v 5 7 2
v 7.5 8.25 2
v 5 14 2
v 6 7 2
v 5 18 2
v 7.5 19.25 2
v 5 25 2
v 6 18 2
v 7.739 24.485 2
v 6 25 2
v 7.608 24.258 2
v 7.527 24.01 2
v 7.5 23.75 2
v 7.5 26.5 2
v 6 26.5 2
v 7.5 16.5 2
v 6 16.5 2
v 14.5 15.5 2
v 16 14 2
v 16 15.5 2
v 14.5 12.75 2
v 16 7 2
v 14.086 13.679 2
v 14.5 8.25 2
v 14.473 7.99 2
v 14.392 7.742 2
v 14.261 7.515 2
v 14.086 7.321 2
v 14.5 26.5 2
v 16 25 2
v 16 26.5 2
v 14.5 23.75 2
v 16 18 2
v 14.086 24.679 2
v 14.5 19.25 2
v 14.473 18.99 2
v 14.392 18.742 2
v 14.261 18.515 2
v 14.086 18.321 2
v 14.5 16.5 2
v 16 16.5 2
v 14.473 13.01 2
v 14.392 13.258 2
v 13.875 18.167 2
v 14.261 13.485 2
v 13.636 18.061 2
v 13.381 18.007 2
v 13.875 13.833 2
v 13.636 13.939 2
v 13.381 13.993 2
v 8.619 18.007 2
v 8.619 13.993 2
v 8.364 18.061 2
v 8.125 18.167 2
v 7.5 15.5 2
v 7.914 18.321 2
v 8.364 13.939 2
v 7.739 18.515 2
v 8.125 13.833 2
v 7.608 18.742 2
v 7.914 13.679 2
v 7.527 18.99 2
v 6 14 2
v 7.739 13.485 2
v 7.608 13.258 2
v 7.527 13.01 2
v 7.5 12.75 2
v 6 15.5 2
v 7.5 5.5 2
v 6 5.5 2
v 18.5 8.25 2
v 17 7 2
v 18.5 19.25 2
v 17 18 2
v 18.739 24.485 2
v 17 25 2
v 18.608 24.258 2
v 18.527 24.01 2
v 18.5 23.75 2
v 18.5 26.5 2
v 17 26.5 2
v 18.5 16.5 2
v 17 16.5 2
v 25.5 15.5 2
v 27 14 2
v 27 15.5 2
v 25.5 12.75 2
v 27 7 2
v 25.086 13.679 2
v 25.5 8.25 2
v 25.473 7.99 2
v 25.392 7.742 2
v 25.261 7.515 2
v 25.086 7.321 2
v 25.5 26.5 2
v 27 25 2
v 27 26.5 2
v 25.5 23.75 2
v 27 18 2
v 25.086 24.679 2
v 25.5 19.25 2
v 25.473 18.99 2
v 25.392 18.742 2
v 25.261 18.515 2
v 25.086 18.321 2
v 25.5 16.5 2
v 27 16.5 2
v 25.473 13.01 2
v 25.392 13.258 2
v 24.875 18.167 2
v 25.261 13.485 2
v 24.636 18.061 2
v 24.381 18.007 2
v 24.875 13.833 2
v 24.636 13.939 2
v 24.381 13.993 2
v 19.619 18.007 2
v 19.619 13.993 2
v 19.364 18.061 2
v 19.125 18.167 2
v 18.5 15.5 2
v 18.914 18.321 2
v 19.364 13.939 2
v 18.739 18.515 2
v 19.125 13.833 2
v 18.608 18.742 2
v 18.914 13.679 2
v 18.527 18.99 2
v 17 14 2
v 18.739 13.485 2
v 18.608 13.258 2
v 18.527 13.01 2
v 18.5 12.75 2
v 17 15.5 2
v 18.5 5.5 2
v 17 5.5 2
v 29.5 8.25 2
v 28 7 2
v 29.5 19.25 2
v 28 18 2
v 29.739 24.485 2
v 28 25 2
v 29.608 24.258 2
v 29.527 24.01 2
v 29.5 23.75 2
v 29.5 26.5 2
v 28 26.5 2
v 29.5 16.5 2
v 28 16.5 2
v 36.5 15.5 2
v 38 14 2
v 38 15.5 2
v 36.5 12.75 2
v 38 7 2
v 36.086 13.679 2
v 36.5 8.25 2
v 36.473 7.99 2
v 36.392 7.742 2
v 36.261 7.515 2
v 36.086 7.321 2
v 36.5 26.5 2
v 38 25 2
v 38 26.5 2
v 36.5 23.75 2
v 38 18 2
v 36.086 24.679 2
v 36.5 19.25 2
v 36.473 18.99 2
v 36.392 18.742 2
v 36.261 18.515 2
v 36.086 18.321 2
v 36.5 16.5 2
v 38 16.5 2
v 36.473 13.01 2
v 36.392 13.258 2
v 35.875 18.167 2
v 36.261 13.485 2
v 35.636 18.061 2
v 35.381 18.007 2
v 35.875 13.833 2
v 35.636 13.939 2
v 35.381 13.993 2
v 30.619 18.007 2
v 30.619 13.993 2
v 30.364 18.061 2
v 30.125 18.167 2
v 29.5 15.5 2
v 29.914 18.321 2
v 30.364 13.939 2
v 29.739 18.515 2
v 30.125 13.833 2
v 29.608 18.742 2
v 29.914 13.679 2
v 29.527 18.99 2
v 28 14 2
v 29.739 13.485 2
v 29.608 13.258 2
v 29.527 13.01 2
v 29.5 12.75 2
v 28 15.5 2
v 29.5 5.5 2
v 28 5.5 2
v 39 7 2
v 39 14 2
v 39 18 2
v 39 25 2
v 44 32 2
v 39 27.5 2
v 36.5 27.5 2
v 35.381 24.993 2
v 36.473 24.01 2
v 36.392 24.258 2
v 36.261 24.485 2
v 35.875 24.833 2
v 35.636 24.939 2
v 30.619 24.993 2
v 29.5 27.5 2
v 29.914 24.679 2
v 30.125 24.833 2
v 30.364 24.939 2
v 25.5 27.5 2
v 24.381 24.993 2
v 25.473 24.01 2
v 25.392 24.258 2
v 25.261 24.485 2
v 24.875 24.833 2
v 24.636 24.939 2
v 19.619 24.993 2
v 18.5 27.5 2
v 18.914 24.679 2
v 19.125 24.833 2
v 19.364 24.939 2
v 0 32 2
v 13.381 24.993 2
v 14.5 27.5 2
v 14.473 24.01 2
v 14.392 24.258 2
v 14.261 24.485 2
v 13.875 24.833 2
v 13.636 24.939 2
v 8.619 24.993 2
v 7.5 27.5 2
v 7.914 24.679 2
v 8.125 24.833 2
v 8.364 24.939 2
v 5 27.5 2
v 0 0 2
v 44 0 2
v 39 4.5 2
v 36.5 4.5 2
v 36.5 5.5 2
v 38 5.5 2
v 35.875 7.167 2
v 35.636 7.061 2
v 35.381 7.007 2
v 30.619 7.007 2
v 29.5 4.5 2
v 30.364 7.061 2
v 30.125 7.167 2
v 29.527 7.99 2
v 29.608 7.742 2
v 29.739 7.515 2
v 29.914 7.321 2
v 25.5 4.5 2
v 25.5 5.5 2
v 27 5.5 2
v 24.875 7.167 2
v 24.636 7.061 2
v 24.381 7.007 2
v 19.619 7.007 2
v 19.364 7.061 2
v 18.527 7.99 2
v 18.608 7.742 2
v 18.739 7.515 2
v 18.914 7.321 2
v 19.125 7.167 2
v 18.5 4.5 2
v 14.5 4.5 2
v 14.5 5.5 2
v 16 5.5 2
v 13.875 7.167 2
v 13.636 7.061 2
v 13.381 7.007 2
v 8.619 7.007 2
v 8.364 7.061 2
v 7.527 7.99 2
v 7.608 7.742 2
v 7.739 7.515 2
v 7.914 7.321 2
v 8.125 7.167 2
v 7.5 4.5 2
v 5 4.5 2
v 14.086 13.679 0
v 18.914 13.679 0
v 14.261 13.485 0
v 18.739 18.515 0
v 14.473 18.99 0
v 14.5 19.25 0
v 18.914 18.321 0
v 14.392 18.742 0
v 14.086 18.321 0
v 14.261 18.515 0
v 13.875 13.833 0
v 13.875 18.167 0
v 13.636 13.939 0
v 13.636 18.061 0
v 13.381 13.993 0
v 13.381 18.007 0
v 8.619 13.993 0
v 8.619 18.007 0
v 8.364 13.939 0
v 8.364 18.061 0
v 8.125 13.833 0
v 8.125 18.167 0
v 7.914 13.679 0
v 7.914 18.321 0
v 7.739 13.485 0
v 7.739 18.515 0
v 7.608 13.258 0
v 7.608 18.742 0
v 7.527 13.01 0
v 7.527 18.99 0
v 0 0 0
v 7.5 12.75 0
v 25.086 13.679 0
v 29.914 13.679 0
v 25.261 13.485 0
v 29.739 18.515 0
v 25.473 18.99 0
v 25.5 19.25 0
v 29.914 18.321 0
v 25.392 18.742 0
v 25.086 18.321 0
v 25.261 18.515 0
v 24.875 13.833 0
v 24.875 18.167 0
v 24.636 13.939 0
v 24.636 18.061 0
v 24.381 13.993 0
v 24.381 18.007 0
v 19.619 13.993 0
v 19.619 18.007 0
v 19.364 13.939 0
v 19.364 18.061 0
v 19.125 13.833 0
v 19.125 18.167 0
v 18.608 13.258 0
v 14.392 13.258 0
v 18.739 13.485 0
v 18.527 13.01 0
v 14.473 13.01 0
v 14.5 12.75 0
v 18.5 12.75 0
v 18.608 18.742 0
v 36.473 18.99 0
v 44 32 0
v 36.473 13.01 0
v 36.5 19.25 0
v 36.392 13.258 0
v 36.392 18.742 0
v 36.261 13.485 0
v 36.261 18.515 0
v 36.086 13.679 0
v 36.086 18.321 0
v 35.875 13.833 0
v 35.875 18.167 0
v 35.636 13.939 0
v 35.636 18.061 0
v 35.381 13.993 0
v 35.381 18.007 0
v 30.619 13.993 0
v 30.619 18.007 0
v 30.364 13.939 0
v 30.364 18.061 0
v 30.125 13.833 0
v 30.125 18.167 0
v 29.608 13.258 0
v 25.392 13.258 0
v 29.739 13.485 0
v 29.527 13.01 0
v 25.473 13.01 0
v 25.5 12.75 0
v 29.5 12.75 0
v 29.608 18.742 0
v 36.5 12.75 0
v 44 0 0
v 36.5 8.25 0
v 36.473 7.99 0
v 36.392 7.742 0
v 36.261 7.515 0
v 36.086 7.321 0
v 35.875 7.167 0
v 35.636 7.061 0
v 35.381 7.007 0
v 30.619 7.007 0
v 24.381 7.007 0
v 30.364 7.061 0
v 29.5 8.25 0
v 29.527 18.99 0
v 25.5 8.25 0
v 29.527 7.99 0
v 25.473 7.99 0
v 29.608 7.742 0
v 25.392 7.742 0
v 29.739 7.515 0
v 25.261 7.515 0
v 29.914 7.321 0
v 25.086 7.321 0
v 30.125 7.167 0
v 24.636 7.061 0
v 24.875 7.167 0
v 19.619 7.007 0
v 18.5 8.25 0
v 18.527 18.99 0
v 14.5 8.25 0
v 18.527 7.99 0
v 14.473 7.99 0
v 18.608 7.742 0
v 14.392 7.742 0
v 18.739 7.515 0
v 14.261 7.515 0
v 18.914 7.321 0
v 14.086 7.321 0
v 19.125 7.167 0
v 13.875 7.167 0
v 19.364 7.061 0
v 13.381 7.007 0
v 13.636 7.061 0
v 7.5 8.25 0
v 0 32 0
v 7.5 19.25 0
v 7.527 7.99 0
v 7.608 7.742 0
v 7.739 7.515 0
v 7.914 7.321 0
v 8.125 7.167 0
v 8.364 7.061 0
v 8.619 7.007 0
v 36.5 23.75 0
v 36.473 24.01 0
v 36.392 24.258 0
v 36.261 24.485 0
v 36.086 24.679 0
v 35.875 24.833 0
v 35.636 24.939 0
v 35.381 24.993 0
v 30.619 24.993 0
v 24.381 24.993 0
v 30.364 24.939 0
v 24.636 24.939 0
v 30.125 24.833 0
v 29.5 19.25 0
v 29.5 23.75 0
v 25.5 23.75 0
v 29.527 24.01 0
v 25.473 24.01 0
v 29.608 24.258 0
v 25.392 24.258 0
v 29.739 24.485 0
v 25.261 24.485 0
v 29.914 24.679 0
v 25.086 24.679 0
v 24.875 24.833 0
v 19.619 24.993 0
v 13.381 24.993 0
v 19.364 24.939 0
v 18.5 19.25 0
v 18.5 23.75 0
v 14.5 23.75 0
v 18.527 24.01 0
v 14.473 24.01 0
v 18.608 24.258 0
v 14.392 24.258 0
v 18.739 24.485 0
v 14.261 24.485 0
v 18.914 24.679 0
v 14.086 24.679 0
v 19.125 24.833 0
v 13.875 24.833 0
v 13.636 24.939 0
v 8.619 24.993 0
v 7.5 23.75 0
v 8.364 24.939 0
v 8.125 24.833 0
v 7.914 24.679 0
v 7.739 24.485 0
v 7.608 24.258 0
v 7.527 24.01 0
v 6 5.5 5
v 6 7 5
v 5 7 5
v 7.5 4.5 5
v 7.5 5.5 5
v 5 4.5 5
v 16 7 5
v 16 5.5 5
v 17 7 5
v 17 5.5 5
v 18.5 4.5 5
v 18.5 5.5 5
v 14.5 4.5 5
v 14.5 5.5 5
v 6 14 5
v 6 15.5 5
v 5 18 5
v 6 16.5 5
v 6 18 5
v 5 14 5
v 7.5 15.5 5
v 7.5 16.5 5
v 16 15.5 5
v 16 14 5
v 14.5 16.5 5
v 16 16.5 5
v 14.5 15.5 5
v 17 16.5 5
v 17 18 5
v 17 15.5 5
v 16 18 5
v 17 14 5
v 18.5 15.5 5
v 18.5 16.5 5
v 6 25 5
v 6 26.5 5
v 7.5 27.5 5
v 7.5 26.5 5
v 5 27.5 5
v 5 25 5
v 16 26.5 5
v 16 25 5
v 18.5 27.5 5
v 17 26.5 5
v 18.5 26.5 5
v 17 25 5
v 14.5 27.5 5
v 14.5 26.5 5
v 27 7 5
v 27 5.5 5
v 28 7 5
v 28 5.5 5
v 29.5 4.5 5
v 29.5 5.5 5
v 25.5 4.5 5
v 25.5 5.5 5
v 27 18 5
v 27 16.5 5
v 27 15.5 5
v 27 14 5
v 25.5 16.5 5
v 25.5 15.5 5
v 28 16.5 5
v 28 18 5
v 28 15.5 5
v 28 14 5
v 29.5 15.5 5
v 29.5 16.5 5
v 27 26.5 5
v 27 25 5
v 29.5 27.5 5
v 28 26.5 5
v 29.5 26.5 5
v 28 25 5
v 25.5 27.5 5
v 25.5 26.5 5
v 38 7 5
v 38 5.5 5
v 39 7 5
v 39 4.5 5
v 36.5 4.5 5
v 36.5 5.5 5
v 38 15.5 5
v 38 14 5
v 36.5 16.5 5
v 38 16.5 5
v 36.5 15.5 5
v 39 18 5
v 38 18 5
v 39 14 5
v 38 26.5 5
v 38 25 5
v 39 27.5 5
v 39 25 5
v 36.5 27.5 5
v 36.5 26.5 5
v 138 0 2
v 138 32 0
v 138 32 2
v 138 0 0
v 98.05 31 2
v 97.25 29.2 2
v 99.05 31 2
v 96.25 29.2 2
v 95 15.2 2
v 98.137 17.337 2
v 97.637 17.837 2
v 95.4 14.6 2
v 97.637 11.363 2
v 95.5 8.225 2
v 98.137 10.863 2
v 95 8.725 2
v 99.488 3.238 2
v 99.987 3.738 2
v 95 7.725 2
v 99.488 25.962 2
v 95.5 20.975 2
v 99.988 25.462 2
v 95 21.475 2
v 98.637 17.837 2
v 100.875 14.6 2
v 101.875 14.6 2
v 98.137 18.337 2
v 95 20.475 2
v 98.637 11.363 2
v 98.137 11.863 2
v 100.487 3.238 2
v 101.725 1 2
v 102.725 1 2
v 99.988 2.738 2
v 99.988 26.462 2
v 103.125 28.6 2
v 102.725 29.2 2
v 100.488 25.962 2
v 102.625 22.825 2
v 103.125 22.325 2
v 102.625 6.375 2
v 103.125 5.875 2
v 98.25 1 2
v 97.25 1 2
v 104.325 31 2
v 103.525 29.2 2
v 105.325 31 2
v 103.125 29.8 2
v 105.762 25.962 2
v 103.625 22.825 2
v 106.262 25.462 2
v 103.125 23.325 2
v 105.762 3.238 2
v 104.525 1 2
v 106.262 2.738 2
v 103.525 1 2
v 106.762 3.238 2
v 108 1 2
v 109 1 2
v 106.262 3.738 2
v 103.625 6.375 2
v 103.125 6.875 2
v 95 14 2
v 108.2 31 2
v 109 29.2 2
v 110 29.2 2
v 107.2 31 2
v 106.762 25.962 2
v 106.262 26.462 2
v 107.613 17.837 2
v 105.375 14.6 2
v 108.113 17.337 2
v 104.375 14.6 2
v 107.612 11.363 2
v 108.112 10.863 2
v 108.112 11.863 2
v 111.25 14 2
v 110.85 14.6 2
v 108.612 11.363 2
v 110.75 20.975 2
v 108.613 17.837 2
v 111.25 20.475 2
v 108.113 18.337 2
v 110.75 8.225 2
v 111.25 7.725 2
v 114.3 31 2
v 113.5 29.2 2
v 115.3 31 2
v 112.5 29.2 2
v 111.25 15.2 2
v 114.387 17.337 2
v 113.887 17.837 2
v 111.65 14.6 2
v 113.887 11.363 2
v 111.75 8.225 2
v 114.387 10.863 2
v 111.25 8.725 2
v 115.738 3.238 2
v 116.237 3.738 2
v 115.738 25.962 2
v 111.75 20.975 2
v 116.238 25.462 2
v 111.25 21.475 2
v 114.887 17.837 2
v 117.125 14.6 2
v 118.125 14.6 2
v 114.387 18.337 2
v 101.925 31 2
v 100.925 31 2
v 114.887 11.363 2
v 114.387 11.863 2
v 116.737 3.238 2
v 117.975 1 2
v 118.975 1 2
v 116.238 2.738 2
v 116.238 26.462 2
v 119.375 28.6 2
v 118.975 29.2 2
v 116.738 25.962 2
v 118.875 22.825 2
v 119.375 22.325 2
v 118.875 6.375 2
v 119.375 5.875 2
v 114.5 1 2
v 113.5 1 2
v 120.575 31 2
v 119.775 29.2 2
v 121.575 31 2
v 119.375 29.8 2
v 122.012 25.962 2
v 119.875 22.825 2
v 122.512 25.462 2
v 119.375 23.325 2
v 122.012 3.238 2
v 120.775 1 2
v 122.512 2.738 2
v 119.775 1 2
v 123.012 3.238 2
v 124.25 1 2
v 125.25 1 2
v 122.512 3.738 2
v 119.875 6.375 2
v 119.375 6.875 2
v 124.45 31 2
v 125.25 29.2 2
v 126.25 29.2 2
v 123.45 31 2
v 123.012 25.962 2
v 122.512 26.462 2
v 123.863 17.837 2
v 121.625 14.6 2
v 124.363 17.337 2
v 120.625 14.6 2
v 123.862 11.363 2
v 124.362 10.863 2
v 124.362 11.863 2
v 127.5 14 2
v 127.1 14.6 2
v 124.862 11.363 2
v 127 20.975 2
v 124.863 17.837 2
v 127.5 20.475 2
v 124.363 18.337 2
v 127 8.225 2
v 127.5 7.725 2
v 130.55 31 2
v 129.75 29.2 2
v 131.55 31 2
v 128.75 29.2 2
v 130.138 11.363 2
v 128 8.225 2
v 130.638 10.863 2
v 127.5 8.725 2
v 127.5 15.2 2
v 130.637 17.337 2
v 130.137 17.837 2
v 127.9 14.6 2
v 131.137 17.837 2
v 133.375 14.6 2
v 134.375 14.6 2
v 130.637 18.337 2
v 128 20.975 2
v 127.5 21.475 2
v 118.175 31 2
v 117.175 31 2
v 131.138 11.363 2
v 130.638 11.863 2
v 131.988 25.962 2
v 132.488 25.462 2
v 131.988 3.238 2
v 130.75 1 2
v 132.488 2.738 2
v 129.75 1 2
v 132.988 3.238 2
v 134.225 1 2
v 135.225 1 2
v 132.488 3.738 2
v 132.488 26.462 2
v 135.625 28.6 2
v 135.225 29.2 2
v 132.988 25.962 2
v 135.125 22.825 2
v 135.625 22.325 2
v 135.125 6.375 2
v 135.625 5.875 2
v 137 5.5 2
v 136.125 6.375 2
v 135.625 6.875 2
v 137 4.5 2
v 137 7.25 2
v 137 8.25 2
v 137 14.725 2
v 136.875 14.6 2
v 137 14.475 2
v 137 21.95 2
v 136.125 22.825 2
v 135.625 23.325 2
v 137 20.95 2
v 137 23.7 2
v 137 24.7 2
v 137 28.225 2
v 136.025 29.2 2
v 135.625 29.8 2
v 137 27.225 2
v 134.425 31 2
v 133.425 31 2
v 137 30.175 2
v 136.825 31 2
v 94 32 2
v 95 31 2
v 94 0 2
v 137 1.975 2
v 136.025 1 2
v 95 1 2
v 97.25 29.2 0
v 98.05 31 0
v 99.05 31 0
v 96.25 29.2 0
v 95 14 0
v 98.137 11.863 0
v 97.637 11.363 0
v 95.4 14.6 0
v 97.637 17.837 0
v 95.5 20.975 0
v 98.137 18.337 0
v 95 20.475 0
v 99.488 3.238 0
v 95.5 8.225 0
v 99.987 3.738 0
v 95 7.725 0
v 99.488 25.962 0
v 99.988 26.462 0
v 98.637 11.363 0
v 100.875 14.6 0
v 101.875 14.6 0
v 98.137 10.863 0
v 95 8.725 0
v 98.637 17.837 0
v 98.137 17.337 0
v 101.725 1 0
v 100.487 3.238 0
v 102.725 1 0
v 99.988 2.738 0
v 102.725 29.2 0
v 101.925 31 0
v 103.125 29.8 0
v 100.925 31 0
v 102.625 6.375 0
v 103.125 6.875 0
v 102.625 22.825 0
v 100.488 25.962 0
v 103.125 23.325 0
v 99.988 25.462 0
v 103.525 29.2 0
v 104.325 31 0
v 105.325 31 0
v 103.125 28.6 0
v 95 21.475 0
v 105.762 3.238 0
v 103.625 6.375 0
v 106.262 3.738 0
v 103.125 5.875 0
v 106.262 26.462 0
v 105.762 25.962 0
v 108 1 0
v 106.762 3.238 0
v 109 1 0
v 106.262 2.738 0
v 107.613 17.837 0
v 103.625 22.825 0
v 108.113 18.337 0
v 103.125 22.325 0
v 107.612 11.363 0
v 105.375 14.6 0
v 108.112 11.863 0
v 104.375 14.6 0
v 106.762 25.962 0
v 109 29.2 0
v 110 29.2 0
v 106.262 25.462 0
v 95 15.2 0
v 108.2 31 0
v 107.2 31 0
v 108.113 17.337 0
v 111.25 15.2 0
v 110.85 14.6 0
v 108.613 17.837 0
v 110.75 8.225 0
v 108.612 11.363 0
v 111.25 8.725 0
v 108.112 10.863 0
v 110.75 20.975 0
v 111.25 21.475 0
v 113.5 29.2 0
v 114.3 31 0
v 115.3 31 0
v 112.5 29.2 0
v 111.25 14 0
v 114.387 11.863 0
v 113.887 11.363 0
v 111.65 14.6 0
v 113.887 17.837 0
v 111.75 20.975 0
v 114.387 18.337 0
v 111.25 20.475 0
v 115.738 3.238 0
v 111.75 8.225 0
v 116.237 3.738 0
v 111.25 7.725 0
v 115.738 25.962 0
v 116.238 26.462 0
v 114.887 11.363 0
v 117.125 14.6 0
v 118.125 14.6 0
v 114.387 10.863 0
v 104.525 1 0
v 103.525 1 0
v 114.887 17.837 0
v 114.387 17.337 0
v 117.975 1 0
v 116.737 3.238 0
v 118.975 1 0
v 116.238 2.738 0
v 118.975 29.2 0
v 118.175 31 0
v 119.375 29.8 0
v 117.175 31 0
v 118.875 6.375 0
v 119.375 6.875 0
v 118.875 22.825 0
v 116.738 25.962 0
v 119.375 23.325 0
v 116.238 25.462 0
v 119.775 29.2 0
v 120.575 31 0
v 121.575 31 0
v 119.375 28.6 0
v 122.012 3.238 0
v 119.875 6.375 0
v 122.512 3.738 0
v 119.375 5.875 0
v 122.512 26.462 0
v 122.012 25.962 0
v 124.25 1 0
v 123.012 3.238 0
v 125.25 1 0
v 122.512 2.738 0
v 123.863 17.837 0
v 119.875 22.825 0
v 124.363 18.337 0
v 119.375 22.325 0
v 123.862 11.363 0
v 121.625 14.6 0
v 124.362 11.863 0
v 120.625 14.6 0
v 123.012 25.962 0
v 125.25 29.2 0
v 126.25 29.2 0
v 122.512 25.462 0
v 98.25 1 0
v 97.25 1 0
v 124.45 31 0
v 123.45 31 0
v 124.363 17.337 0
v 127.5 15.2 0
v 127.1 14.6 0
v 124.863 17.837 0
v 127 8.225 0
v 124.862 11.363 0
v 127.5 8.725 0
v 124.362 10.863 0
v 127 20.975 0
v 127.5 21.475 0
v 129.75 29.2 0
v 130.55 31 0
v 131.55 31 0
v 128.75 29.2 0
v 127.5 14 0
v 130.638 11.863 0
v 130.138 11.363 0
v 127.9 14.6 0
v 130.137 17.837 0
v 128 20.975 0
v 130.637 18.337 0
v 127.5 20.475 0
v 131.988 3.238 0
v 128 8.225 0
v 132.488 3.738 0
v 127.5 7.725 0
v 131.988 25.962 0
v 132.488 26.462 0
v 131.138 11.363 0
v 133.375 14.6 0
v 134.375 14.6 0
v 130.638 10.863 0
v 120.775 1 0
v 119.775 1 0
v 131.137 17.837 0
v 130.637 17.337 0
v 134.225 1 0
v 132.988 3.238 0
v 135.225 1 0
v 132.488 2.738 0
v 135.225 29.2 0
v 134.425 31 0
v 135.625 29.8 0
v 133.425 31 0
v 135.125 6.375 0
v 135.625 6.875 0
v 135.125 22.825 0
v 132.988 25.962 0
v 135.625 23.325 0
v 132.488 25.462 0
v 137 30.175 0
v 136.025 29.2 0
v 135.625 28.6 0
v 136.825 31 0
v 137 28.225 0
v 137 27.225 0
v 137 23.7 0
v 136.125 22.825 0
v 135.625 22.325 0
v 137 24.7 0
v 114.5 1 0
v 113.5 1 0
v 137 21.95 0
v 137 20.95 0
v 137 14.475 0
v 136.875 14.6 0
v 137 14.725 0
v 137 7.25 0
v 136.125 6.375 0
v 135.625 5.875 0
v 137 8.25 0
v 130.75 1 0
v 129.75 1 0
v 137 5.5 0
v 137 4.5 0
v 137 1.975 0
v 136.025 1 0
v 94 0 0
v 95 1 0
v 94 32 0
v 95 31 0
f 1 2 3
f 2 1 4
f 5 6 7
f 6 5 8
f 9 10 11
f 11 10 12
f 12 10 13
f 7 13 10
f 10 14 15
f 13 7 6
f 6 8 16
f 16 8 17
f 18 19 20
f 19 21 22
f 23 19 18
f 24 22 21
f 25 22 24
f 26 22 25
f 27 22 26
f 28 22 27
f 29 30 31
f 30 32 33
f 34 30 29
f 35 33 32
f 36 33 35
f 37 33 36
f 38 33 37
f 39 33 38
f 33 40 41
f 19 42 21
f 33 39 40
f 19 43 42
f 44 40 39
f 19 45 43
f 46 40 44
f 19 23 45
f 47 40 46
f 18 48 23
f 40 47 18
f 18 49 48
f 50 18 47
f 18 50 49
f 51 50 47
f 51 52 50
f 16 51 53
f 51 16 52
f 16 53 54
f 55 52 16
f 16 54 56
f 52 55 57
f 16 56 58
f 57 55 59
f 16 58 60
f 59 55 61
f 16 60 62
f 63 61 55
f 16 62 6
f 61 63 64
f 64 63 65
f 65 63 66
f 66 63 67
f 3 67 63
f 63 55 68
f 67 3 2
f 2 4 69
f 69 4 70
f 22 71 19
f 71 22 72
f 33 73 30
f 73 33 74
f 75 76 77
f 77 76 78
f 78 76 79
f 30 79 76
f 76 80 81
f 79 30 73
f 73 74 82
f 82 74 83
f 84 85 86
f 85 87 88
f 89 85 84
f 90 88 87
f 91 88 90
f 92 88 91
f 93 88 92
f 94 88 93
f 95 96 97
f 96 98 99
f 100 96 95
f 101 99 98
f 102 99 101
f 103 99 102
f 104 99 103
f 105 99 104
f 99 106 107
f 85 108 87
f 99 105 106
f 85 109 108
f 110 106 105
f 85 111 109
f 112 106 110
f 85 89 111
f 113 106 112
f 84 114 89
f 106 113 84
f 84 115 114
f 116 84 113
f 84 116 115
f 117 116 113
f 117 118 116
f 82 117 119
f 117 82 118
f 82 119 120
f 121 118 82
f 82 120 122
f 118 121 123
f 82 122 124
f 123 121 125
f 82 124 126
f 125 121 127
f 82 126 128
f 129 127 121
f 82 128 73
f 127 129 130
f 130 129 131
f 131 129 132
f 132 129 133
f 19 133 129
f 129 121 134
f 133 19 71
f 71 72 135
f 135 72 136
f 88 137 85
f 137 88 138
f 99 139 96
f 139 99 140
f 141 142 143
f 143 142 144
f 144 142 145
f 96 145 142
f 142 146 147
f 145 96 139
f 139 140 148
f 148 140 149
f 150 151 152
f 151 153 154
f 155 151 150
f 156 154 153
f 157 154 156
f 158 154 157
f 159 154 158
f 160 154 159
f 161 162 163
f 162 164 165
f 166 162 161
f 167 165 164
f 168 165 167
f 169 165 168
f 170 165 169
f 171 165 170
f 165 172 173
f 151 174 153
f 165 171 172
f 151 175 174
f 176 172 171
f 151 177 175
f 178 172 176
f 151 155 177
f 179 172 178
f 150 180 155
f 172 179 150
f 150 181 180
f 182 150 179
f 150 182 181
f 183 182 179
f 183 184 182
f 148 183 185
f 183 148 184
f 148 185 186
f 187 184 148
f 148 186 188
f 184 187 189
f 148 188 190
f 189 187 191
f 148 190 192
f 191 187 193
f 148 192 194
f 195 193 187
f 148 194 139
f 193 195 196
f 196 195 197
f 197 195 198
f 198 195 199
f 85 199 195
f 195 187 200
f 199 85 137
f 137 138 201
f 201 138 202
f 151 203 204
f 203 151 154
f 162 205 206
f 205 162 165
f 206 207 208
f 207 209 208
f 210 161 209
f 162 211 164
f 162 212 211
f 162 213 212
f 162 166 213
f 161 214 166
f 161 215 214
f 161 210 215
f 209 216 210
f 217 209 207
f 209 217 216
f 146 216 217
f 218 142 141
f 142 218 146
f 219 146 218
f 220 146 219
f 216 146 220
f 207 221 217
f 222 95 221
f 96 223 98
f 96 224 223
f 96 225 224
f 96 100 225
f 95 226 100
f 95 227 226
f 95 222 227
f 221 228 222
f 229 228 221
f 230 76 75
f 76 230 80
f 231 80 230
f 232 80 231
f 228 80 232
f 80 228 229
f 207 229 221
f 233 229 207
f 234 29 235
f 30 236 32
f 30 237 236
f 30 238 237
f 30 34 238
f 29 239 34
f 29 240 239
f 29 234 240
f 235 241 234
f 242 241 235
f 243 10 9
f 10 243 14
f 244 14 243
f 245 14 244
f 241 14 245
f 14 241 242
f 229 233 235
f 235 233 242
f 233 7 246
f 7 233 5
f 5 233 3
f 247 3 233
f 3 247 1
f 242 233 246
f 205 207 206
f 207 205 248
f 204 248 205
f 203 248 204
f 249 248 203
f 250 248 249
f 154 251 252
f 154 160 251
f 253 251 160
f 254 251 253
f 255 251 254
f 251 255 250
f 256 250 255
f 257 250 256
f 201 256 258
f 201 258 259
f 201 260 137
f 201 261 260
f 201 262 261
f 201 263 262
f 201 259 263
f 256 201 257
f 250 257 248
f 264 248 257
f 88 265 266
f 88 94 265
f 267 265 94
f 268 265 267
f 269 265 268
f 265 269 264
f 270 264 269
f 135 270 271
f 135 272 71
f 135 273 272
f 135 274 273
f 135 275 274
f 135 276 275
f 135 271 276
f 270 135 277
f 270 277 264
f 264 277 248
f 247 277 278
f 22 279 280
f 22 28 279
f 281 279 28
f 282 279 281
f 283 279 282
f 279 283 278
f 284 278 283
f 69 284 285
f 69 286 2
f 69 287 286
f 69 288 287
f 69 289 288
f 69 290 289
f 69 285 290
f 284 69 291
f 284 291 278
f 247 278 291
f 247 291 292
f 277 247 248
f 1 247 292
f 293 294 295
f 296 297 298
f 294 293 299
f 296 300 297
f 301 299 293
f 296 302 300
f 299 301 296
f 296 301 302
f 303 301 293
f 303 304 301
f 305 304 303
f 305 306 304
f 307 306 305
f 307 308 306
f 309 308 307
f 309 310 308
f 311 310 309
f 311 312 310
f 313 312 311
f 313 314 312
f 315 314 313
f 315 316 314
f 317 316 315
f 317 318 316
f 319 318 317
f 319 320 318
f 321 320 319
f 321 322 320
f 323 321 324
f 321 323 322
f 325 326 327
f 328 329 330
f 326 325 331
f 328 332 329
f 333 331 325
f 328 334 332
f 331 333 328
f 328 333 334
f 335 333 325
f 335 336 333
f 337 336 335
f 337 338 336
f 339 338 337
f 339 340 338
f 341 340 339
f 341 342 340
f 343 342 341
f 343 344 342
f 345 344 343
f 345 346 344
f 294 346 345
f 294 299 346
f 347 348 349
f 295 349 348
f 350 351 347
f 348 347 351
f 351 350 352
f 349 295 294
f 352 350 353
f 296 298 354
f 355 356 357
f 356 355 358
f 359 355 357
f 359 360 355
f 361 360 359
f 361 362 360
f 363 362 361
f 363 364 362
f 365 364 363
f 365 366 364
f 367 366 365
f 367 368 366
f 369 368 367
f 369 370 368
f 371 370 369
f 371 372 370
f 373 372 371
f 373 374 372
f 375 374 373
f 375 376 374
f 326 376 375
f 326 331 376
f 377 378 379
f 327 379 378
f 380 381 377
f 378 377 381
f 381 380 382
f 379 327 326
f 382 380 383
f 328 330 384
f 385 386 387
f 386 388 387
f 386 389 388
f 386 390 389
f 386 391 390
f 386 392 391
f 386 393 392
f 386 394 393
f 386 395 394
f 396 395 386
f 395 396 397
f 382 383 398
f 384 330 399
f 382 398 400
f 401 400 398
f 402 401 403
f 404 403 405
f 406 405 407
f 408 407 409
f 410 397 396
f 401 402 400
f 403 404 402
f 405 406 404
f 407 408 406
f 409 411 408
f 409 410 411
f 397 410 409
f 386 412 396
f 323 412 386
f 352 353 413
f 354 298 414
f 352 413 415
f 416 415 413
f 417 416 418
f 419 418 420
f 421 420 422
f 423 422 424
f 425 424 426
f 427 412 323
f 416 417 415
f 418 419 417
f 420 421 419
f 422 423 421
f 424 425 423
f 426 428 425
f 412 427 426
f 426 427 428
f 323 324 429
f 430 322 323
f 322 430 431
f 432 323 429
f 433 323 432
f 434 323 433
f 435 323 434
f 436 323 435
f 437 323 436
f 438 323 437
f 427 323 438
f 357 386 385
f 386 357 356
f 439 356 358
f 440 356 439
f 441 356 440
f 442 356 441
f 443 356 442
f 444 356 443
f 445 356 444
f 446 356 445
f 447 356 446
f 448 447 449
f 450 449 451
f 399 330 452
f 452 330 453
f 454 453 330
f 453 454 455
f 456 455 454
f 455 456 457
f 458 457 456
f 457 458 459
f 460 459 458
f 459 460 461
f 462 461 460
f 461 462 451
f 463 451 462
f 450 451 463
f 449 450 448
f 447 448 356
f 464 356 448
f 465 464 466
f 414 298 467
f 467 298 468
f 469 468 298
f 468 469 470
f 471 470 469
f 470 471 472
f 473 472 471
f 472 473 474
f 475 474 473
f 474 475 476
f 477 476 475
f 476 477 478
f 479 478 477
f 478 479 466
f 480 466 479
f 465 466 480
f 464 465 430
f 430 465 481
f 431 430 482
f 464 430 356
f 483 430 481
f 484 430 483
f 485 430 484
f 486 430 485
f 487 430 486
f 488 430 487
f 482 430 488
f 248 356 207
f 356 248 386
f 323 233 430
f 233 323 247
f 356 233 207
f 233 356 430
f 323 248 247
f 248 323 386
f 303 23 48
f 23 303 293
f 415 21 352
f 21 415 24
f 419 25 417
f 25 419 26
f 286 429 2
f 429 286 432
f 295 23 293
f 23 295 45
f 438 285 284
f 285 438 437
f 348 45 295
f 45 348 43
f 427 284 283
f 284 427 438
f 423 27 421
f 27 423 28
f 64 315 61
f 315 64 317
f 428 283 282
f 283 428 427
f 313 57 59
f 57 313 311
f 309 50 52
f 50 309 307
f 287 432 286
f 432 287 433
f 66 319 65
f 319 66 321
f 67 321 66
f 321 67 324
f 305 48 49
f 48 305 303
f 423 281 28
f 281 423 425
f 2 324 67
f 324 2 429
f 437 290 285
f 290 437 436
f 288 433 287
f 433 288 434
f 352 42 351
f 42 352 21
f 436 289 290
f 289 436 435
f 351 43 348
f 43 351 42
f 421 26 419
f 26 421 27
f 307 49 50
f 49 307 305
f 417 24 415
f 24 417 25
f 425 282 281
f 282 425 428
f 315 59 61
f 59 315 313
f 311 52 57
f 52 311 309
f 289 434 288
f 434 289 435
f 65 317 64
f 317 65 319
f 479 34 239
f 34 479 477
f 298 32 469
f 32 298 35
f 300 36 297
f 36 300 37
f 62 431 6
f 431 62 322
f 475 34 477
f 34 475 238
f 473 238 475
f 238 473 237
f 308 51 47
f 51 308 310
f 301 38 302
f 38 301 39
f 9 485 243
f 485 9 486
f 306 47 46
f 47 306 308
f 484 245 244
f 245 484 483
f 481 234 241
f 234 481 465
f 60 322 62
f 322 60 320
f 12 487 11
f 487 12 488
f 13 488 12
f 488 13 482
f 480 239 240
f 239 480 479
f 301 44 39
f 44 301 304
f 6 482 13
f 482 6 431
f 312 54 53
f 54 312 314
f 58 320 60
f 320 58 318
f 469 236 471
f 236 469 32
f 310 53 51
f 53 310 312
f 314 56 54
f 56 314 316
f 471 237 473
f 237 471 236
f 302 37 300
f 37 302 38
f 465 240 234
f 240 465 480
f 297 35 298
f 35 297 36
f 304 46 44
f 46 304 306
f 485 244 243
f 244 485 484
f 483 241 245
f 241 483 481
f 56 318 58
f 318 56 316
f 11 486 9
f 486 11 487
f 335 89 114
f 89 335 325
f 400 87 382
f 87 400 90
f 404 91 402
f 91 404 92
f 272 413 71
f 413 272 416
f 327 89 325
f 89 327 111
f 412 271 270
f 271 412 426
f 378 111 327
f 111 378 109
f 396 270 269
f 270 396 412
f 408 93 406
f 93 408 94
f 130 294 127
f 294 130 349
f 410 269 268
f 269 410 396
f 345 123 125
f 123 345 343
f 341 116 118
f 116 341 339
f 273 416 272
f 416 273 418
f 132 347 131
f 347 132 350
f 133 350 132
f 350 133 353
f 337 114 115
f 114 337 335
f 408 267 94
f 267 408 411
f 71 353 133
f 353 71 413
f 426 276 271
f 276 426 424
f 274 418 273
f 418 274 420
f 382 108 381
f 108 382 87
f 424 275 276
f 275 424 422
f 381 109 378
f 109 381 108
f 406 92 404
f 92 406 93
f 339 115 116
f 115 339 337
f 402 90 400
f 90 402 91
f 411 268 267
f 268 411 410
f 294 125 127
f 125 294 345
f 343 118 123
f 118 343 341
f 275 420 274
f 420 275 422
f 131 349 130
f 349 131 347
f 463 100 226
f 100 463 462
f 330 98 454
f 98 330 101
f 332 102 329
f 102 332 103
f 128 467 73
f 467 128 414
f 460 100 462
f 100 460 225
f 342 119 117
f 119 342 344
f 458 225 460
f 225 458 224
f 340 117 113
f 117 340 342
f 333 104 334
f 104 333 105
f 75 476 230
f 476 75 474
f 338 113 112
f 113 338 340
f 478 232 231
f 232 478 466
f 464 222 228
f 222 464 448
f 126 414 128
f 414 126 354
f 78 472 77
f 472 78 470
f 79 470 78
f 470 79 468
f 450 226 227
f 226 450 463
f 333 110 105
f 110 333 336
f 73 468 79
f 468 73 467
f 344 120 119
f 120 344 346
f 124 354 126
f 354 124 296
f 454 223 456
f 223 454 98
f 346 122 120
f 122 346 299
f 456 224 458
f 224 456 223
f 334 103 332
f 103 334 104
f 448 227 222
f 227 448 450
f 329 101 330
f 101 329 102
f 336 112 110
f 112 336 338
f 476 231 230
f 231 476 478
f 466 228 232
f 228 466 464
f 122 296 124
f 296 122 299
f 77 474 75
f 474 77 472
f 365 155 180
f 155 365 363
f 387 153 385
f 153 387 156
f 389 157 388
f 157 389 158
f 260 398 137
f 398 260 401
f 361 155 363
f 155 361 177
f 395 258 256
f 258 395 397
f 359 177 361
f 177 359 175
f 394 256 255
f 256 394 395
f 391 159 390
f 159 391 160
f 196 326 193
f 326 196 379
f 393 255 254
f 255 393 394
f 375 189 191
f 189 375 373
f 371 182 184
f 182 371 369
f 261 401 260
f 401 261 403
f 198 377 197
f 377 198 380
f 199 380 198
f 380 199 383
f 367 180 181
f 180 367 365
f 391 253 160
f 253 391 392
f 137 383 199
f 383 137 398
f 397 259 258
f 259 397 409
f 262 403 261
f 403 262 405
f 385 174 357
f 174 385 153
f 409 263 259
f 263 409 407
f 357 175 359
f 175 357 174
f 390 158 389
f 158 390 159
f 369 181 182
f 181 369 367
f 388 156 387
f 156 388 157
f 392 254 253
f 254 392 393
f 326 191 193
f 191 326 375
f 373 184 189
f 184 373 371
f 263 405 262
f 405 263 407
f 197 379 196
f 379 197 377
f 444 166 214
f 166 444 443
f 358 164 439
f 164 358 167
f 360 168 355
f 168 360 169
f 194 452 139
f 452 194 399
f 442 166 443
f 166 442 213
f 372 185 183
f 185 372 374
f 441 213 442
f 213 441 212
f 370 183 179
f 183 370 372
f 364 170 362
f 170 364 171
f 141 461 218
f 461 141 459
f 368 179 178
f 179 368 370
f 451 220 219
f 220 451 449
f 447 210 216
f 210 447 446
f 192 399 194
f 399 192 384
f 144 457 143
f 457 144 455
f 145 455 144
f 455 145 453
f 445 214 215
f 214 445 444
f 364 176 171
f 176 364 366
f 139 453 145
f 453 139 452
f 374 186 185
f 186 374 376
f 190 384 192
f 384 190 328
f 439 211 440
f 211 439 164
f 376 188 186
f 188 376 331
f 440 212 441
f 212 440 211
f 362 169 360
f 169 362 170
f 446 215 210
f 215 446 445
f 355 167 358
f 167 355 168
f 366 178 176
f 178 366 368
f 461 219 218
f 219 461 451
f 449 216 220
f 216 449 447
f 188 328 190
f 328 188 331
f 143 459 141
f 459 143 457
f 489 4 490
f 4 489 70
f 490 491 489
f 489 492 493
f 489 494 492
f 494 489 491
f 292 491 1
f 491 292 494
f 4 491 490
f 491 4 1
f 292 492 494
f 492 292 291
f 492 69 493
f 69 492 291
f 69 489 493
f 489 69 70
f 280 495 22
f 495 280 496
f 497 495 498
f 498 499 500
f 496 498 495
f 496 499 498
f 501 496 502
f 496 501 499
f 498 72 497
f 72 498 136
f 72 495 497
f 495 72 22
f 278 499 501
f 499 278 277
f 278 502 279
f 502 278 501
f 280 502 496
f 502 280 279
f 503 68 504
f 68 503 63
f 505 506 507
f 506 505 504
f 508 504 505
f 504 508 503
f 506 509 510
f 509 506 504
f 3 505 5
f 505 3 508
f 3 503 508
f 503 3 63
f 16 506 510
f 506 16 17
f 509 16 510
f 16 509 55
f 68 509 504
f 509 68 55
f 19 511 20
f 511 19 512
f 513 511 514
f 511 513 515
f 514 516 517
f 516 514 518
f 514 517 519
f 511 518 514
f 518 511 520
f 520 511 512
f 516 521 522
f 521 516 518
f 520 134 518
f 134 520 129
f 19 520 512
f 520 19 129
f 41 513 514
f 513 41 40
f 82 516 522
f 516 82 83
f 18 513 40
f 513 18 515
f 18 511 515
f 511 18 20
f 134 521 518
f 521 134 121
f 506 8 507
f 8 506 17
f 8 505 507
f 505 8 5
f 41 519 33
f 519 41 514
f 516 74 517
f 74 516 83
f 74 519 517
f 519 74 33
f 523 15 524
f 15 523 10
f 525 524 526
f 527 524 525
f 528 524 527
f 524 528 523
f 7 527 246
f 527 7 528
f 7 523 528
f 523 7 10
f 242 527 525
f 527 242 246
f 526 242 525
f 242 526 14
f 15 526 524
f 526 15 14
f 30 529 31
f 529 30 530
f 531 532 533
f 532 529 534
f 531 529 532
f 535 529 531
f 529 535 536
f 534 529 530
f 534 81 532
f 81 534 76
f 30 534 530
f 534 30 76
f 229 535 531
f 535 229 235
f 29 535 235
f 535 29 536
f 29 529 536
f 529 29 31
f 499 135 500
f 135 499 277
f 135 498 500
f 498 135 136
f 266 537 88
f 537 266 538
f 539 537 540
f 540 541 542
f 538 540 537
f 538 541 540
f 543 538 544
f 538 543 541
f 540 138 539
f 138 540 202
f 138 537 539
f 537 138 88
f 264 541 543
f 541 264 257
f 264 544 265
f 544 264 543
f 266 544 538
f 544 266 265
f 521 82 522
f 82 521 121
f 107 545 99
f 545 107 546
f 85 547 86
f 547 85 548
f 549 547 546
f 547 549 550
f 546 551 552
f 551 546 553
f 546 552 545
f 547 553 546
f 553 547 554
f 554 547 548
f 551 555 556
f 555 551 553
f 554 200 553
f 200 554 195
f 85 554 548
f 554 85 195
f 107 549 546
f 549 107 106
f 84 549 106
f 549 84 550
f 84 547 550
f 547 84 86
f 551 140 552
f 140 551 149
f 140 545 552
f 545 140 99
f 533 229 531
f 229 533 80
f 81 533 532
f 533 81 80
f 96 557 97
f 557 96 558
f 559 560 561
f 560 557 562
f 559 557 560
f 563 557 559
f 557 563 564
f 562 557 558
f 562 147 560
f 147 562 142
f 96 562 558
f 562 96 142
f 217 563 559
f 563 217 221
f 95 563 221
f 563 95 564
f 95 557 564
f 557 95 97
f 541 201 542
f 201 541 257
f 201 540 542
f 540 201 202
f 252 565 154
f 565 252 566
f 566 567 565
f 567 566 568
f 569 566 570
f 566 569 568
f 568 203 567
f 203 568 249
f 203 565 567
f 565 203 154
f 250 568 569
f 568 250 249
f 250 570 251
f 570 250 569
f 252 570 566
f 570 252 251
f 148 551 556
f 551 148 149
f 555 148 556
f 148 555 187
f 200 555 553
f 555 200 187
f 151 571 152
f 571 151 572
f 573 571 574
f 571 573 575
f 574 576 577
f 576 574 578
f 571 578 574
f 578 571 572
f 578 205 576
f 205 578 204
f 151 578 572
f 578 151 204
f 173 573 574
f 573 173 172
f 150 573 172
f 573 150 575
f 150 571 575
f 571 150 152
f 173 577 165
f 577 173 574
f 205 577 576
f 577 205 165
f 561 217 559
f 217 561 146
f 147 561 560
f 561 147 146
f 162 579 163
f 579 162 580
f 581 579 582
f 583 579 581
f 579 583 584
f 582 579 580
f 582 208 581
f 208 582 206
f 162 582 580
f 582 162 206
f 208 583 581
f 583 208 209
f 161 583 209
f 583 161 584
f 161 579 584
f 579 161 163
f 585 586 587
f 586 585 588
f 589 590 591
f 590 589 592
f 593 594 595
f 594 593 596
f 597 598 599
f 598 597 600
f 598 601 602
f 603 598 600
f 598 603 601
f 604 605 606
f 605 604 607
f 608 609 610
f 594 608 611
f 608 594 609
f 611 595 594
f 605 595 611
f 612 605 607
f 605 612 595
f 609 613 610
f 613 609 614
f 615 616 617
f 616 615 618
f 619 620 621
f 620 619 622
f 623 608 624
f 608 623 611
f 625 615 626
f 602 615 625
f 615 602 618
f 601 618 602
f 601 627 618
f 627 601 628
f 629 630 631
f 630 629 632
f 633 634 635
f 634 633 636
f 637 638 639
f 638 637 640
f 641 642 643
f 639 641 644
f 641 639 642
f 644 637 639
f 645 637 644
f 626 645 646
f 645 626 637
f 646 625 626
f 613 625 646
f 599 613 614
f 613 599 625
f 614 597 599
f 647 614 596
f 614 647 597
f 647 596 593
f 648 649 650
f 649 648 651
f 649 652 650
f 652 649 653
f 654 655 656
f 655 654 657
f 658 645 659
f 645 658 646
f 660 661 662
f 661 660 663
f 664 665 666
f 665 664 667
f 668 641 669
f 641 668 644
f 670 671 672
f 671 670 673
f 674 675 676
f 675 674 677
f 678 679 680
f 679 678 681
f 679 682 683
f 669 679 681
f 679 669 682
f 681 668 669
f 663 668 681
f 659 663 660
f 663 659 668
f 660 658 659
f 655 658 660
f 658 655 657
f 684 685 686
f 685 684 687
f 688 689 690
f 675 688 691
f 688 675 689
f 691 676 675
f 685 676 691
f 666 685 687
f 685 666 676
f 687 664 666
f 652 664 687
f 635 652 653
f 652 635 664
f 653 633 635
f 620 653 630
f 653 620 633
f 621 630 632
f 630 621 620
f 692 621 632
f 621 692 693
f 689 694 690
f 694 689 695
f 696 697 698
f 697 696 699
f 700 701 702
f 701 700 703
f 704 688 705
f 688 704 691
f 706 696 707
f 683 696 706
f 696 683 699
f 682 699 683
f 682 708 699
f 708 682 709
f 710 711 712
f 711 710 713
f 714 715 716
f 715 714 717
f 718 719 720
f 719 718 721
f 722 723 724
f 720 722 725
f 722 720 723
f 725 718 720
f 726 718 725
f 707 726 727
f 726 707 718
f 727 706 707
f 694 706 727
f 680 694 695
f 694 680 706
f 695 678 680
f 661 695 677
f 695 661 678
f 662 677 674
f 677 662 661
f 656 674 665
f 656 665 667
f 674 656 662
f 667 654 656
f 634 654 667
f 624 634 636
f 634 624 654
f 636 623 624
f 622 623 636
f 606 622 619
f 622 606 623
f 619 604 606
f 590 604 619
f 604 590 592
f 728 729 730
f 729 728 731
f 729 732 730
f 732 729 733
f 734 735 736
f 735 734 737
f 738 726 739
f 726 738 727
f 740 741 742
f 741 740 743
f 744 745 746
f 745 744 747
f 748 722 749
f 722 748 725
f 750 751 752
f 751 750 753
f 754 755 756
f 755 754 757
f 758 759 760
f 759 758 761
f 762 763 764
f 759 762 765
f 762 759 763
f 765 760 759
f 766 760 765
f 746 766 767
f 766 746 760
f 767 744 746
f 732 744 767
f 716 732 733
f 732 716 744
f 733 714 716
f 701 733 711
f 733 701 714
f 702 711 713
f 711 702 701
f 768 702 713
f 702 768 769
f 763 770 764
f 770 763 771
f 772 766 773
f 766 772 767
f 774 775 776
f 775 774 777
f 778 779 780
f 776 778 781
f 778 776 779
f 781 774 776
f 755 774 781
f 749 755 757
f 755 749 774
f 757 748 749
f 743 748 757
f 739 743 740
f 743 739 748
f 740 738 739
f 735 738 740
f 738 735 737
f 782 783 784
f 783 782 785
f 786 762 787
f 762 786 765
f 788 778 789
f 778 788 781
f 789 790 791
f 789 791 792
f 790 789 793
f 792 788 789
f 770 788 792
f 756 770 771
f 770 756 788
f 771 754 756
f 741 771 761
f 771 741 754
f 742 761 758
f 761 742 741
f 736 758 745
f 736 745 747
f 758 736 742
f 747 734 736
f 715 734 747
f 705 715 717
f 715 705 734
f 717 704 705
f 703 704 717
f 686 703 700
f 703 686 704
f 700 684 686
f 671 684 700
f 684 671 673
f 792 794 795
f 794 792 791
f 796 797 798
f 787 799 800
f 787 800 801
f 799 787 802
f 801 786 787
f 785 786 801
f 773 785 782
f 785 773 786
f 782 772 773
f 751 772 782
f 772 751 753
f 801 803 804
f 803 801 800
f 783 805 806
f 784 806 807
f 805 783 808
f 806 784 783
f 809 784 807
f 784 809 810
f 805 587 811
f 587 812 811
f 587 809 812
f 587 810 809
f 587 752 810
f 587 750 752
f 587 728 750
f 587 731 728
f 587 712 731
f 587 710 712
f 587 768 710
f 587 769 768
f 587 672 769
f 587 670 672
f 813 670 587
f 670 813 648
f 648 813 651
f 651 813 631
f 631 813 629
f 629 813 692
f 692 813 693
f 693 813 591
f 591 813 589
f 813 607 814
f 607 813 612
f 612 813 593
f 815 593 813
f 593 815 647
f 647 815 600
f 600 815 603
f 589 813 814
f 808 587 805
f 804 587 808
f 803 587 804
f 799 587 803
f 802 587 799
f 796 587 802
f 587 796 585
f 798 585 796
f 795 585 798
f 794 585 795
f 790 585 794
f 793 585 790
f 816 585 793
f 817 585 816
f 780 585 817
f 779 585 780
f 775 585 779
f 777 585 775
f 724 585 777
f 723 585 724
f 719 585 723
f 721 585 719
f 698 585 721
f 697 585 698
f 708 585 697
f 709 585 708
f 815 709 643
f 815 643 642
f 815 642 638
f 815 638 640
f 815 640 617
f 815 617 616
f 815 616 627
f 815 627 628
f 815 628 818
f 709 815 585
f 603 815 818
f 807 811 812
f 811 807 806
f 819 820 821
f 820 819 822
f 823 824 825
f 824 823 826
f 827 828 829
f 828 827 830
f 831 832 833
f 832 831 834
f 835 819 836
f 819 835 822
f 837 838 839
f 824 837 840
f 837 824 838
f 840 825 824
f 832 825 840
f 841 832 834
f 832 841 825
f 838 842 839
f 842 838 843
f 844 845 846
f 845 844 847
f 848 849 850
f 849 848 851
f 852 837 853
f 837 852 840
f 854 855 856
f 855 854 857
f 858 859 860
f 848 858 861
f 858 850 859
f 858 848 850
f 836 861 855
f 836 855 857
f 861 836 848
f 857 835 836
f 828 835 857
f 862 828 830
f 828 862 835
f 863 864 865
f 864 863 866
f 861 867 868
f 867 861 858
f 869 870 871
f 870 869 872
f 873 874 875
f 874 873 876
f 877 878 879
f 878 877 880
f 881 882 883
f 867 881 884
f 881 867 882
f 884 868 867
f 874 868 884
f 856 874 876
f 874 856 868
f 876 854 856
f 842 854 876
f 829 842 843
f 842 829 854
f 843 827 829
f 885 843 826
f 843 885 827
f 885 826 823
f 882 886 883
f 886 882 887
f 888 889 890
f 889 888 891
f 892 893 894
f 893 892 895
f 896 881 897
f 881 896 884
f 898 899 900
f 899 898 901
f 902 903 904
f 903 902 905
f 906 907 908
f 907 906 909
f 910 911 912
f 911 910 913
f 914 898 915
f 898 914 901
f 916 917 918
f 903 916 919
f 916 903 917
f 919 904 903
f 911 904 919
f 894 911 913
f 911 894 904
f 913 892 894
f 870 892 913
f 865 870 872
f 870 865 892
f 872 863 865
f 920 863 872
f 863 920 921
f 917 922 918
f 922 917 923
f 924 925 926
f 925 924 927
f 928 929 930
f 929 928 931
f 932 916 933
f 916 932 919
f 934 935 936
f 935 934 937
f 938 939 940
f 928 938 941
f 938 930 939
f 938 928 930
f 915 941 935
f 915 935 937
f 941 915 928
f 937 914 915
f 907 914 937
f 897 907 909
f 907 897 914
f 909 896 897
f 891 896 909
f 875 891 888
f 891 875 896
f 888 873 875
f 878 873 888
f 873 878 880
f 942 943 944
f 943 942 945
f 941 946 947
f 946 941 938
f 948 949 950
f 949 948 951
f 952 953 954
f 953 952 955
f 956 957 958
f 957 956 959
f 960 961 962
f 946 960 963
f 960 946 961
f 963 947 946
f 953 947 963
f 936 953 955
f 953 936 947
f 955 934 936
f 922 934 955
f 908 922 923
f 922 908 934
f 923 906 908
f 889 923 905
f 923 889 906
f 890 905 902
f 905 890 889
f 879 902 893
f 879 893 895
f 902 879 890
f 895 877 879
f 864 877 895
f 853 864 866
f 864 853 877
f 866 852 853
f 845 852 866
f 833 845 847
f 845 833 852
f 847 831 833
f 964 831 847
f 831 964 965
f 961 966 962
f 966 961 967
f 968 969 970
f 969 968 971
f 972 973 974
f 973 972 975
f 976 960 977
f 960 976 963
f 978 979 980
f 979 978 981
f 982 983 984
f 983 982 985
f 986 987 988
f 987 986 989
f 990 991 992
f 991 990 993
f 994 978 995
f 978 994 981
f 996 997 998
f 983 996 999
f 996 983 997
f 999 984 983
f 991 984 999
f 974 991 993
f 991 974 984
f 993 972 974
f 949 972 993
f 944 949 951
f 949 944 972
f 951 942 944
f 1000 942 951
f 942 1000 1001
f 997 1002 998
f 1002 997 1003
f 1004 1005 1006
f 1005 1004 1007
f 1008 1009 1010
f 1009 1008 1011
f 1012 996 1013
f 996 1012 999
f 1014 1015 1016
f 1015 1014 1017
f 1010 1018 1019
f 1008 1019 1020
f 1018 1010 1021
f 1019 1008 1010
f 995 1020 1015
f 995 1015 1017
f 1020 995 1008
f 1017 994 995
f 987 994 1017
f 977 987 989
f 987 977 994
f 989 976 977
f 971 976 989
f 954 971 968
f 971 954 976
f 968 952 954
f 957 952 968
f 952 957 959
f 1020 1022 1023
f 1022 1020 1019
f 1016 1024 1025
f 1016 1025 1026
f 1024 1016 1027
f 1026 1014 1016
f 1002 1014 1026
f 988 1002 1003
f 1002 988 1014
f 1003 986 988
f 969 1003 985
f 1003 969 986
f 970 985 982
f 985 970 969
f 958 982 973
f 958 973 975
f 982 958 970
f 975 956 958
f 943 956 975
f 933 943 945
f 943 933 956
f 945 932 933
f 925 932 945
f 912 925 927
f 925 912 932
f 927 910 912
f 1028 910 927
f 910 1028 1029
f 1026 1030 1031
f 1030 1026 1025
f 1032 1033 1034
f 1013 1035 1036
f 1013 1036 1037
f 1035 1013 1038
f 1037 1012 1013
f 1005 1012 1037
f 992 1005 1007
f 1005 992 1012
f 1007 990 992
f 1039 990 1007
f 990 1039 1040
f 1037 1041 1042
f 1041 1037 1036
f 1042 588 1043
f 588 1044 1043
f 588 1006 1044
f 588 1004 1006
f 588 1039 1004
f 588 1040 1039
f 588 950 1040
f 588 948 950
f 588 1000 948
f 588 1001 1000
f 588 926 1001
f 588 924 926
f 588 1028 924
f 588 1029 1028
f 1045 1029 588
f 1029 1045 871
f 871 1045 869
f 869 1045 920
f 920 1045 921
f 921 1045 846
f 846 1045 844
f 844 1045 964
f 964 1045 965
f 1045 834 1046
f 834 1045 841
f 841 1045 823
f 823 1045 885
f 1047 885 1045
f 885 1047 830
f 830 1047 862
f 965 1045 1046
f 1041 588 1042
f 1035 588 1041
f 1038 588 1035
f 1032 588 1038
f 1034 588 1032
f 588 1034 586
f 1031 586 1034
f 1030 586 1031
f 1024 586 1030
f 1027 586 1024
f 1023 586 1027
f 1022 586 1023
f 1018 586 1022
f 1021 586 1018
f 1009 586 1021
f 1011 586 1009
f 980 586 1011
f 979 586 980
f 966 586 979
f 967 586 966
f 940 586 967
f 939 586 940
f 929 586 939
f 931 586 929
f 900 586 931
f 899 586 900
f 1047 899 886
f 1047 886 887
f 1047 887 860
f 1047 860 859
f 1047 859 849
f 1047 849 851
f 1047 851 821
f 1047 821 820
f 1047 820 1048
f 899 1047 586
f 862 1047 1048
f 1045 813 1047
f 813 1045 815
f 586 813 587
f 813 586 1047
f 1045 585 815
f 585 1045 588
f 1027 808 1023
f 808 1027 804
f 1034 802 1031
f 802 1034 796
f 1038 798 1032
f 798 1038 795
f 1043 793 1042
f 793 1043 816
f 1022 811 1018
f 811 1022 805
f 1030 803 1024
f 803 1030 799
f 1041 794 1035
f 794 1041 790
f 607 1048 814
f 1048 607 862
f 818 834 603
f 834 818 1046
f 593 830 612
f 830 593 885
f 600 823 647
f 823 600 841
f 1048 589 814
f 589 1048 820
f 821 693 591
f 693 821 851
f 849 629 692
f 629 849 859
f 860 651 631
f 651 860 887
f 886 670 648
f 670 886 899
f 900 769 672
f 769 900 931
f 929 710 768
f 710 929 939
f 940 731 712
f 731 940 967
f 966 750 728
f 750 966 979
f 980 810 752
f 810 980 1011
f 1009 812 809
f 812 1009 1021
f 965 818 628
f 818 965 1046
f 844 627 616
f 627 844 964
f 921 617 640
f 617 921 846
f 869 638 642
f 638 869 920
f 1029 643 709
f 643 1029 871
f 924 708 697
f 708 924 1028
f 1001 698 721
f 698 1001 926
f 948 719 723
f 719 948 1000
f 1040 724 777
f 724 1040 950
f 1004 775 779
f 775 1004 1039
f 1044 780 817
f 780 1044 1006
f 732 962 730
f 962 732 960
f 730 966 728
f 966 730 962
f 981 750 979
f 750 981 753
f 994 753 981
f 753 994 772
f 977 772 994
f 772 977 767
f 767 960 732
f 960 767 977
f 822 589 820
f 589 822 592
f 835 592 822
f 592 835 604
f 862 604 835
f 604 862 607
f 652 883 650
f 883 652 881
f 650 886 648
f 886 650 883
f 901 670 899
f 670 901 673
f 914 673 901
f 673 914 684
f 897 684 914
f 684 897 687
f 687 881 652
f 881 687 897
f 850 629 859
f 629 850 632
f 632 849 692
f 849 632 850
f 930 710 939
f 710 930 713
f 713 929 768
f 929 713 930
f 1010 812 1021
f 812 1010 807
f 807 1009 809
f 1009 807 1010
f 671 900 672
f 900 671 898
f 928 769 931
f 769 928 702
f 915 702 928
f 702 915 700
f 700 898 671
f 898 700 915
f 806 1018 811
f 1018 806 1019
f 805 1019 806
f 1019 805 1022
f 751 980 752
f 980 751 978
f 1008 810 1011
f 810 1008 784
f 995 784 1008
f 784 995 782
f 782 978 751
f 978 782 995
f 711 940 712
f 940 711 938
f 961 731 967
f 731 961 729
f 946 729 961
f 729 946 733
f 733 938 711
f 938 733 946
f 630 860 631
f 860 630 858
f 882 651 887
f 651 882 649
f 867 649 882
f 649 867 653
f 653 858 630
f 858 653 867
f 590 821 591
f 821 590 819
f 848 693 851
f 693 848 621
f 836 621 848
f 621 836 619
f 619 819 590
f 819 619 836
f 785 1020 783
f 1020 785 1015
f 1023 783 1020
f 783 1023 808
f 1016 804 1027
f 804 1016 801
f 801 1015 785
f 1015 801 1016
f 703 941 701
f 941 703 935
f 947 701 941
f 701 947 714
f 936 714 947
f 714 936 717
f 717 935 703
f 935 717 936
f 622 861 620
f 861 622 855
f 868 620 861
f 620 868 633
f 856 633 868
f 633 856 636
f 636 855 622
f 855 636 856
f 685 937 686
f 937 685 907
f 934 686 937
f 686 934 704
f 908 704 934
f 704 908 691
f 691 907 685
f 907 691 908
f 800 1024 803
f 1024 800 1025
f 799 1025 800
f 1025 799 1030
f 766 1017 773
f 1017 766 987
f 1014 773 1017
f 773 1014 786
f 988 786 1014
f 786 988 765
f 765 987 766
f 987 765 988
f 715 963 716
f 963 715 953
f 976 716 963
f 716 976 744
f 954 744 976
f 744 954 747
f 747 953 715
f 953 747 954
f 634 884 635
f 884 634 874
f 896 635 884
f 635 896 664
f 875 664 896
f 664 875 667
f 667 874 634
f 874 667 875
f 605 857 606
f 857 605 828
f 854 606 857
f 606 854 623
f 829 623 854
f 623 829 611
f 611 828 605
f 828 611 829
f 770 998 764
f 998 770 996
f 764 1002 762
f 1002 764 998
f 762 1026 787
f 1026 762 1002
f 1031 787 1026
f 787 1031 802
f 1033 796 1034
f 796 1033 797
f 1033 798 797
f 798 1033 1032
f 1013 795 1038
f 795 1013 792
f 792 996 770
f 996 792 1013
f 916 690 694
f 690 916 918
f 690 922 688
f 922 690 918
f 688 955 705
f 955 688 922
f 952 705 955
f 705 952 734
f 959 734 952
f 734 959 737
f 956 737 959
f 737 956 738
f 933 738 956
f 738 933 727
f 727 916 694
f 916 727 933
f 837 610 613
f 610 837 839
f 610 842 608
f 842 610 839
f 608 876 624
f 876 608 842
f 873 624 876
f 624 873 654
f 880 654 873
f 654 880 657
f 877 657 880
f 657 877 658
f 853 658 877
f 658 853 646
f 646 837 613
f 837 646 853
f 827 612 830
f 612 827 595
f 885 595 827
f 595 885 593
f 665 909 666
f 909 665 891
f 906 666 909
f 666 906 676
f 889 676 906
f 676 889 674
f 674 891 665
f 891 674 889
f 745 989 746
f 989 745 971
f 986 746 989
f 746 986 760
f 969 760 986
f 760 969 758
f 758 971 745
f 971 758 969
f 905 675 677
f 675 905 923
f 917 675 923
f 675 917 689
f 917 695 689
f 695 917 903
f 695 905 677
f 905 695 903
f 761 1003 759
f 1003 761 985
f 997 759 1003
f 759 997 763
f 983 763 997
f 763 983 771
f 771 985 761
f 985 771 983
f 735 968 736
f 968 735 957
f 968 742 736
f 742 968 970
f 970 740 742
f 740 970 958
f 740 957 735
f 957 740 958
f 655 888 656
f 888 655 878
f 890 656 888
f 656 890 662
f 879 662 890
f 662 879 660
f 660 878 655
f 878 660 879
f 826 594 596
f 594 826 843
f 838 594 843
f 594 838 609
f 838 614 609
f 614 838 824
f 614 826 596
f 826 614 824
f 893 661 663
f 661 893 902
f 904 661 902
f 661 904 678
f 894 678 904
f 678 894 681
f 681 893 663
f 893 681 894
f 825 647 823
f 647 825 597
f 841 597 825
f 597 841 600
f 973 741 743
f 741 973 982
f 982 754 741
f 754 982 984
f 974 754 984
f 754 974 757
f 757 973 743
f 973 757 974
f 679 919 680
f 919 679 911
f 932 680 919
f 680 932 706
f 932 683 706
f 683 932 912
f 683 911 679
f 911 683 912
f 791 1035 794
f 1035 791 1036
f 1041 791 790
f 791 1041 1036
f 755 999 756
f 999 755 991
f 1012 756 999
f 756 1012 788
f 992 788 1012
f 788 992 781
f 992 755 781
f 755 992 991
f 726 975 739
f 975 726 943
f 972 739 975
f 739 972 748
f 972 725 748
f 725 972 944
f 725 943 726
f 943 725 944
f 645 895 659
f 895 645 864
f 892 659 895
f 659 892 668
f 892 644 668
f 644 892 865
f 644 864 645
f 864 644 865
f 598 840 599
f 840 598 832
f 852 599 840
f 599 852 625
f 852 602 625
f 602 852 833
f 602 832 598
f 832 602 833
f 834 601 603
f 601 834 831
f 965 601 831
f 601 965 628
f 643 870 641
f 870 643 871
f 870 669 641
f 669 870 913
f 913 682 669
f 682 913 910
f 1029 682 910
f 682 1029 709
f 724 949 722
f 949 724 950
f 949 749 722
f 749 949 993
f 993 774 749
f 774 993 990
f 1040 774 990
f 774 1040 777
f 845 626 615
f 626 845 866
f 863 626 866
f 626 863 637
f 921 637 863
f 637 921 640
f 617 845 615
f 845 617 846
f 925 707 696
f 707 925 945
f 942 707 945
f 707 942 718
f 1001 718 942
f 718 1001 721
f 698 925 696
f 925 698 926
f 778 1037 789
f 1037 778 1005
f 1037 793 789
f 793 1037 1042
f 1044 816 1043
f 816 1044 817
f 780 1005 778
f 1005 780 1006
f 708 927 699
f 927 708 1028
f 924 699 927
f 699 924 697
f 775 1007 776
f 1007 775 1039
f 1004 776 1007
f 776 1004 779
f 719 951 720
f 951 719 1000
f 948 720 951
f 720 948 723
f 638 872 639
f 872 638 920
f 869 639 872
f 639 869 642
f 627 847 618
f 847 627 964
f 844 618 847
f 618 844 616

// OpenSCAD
// Test: preview panel metadata
// A tray is rendered once even when three copies should be printed. Its lid
// inherits the tray dimensions and counter sets, but retains its own default
// print count of one and does not inherit the tray label. In preview, both
// panels show print quantity, counter capacity and size, and tray dimensions
// 5 mm beyond their positive-Y edge; only the tray shows its label.
// One separate full-set block reports the shared footprint and stack height.

include <../../release/lib/counter_tray_designer_lib.1.scad>

TEST_PREVIEW_METADATA =
[
    [G_FLOOR_THICKNESS_N, 2],
    [G_FRAME_STYLE_N, 4],
    [G_MIN_PADDING_XY, [1, 1]],

    [TRAY,
        [NAME, "Player Aid Counters"],
        [PRINT_COUNT_N, 3],
        [G_DIMENSIONS_XY, [44, 32]],
        [COUNTER_SET,
            [COUNTER_SIZE_XYZ, [10, 10, 3]],
        ],
    ],
    [LID],
];

TEST_PREVIEW_GLOBALS = get_top_level_globals(TEST_PREVIEW_METADATA);
TEST_PREVIEW_TRAY = _grid_item_effective_data(TEST_PREVIEW_METADATA, TEST_PREVIEW_GLOBALS, 0);
TEST_PREVIEW_LID = _grid_item_effective_data(TEST_PREVIEW_METADATA, TEST_PREVIEW_GLOBALS, 1);
TEST_PREVIEW_TOTAL_HEIGHT = _get_total_stack_height(TEST_PREVIEW_METADATA, TEST_PREVIEW_GLOBALS);
TEST_PREVIEW_SET_XY = _get_full_set_dimensions_xy(TEST_PREVIEW_METADATA, TEST_PREVIEW_GLOBALS);

assert(_count_grid_items(TEST_PREVIEW_METADATA, TEST_PREVIEW_GLOBALS) == 2,
    "Preview must contain one tray panel and one lid panel");
assert(find_value(TEST_PREVIEW_TRAY, PRINT_COUNT_N, default = 1) == 3,
    "Tray print quantity must remain available to its preview label");
assert(find_value(TEST_PREVIEW_TRAY, NAME, default = "") == "Player Aid Counters",
    "Tray name must remain available to its preview label");
assert(find_value(TEST_PREVIEW_LID, NAME, default = "") == "",
    "Lid preview must not inherit the preceding tray name");
assert(find_value(TEST_PREVIEW_LID, G_DIMENSIONS_XY) == [44, 32],
    "Lid must inherit dimensions from its preceding tray");
assert(find_value(TEST_PREVIEW_LID, PRINT_COUNT_N, default = 1) == 1,
    "Lid must not inherit the tray print quantity");
assert(abs(TEST_PREVIEW_TOTAL_HEIGHT - 17) < 0.001,
    "Total height must include three 5 mm trays and one 2 mm lid that follows the floor");
assert(TEST_PREVIEW_SET_XY == [44, 32],
    "Full-set footprint must use the widest and deepest panel dimensions");

Make(TEST_PREVIEW_METADATA);
